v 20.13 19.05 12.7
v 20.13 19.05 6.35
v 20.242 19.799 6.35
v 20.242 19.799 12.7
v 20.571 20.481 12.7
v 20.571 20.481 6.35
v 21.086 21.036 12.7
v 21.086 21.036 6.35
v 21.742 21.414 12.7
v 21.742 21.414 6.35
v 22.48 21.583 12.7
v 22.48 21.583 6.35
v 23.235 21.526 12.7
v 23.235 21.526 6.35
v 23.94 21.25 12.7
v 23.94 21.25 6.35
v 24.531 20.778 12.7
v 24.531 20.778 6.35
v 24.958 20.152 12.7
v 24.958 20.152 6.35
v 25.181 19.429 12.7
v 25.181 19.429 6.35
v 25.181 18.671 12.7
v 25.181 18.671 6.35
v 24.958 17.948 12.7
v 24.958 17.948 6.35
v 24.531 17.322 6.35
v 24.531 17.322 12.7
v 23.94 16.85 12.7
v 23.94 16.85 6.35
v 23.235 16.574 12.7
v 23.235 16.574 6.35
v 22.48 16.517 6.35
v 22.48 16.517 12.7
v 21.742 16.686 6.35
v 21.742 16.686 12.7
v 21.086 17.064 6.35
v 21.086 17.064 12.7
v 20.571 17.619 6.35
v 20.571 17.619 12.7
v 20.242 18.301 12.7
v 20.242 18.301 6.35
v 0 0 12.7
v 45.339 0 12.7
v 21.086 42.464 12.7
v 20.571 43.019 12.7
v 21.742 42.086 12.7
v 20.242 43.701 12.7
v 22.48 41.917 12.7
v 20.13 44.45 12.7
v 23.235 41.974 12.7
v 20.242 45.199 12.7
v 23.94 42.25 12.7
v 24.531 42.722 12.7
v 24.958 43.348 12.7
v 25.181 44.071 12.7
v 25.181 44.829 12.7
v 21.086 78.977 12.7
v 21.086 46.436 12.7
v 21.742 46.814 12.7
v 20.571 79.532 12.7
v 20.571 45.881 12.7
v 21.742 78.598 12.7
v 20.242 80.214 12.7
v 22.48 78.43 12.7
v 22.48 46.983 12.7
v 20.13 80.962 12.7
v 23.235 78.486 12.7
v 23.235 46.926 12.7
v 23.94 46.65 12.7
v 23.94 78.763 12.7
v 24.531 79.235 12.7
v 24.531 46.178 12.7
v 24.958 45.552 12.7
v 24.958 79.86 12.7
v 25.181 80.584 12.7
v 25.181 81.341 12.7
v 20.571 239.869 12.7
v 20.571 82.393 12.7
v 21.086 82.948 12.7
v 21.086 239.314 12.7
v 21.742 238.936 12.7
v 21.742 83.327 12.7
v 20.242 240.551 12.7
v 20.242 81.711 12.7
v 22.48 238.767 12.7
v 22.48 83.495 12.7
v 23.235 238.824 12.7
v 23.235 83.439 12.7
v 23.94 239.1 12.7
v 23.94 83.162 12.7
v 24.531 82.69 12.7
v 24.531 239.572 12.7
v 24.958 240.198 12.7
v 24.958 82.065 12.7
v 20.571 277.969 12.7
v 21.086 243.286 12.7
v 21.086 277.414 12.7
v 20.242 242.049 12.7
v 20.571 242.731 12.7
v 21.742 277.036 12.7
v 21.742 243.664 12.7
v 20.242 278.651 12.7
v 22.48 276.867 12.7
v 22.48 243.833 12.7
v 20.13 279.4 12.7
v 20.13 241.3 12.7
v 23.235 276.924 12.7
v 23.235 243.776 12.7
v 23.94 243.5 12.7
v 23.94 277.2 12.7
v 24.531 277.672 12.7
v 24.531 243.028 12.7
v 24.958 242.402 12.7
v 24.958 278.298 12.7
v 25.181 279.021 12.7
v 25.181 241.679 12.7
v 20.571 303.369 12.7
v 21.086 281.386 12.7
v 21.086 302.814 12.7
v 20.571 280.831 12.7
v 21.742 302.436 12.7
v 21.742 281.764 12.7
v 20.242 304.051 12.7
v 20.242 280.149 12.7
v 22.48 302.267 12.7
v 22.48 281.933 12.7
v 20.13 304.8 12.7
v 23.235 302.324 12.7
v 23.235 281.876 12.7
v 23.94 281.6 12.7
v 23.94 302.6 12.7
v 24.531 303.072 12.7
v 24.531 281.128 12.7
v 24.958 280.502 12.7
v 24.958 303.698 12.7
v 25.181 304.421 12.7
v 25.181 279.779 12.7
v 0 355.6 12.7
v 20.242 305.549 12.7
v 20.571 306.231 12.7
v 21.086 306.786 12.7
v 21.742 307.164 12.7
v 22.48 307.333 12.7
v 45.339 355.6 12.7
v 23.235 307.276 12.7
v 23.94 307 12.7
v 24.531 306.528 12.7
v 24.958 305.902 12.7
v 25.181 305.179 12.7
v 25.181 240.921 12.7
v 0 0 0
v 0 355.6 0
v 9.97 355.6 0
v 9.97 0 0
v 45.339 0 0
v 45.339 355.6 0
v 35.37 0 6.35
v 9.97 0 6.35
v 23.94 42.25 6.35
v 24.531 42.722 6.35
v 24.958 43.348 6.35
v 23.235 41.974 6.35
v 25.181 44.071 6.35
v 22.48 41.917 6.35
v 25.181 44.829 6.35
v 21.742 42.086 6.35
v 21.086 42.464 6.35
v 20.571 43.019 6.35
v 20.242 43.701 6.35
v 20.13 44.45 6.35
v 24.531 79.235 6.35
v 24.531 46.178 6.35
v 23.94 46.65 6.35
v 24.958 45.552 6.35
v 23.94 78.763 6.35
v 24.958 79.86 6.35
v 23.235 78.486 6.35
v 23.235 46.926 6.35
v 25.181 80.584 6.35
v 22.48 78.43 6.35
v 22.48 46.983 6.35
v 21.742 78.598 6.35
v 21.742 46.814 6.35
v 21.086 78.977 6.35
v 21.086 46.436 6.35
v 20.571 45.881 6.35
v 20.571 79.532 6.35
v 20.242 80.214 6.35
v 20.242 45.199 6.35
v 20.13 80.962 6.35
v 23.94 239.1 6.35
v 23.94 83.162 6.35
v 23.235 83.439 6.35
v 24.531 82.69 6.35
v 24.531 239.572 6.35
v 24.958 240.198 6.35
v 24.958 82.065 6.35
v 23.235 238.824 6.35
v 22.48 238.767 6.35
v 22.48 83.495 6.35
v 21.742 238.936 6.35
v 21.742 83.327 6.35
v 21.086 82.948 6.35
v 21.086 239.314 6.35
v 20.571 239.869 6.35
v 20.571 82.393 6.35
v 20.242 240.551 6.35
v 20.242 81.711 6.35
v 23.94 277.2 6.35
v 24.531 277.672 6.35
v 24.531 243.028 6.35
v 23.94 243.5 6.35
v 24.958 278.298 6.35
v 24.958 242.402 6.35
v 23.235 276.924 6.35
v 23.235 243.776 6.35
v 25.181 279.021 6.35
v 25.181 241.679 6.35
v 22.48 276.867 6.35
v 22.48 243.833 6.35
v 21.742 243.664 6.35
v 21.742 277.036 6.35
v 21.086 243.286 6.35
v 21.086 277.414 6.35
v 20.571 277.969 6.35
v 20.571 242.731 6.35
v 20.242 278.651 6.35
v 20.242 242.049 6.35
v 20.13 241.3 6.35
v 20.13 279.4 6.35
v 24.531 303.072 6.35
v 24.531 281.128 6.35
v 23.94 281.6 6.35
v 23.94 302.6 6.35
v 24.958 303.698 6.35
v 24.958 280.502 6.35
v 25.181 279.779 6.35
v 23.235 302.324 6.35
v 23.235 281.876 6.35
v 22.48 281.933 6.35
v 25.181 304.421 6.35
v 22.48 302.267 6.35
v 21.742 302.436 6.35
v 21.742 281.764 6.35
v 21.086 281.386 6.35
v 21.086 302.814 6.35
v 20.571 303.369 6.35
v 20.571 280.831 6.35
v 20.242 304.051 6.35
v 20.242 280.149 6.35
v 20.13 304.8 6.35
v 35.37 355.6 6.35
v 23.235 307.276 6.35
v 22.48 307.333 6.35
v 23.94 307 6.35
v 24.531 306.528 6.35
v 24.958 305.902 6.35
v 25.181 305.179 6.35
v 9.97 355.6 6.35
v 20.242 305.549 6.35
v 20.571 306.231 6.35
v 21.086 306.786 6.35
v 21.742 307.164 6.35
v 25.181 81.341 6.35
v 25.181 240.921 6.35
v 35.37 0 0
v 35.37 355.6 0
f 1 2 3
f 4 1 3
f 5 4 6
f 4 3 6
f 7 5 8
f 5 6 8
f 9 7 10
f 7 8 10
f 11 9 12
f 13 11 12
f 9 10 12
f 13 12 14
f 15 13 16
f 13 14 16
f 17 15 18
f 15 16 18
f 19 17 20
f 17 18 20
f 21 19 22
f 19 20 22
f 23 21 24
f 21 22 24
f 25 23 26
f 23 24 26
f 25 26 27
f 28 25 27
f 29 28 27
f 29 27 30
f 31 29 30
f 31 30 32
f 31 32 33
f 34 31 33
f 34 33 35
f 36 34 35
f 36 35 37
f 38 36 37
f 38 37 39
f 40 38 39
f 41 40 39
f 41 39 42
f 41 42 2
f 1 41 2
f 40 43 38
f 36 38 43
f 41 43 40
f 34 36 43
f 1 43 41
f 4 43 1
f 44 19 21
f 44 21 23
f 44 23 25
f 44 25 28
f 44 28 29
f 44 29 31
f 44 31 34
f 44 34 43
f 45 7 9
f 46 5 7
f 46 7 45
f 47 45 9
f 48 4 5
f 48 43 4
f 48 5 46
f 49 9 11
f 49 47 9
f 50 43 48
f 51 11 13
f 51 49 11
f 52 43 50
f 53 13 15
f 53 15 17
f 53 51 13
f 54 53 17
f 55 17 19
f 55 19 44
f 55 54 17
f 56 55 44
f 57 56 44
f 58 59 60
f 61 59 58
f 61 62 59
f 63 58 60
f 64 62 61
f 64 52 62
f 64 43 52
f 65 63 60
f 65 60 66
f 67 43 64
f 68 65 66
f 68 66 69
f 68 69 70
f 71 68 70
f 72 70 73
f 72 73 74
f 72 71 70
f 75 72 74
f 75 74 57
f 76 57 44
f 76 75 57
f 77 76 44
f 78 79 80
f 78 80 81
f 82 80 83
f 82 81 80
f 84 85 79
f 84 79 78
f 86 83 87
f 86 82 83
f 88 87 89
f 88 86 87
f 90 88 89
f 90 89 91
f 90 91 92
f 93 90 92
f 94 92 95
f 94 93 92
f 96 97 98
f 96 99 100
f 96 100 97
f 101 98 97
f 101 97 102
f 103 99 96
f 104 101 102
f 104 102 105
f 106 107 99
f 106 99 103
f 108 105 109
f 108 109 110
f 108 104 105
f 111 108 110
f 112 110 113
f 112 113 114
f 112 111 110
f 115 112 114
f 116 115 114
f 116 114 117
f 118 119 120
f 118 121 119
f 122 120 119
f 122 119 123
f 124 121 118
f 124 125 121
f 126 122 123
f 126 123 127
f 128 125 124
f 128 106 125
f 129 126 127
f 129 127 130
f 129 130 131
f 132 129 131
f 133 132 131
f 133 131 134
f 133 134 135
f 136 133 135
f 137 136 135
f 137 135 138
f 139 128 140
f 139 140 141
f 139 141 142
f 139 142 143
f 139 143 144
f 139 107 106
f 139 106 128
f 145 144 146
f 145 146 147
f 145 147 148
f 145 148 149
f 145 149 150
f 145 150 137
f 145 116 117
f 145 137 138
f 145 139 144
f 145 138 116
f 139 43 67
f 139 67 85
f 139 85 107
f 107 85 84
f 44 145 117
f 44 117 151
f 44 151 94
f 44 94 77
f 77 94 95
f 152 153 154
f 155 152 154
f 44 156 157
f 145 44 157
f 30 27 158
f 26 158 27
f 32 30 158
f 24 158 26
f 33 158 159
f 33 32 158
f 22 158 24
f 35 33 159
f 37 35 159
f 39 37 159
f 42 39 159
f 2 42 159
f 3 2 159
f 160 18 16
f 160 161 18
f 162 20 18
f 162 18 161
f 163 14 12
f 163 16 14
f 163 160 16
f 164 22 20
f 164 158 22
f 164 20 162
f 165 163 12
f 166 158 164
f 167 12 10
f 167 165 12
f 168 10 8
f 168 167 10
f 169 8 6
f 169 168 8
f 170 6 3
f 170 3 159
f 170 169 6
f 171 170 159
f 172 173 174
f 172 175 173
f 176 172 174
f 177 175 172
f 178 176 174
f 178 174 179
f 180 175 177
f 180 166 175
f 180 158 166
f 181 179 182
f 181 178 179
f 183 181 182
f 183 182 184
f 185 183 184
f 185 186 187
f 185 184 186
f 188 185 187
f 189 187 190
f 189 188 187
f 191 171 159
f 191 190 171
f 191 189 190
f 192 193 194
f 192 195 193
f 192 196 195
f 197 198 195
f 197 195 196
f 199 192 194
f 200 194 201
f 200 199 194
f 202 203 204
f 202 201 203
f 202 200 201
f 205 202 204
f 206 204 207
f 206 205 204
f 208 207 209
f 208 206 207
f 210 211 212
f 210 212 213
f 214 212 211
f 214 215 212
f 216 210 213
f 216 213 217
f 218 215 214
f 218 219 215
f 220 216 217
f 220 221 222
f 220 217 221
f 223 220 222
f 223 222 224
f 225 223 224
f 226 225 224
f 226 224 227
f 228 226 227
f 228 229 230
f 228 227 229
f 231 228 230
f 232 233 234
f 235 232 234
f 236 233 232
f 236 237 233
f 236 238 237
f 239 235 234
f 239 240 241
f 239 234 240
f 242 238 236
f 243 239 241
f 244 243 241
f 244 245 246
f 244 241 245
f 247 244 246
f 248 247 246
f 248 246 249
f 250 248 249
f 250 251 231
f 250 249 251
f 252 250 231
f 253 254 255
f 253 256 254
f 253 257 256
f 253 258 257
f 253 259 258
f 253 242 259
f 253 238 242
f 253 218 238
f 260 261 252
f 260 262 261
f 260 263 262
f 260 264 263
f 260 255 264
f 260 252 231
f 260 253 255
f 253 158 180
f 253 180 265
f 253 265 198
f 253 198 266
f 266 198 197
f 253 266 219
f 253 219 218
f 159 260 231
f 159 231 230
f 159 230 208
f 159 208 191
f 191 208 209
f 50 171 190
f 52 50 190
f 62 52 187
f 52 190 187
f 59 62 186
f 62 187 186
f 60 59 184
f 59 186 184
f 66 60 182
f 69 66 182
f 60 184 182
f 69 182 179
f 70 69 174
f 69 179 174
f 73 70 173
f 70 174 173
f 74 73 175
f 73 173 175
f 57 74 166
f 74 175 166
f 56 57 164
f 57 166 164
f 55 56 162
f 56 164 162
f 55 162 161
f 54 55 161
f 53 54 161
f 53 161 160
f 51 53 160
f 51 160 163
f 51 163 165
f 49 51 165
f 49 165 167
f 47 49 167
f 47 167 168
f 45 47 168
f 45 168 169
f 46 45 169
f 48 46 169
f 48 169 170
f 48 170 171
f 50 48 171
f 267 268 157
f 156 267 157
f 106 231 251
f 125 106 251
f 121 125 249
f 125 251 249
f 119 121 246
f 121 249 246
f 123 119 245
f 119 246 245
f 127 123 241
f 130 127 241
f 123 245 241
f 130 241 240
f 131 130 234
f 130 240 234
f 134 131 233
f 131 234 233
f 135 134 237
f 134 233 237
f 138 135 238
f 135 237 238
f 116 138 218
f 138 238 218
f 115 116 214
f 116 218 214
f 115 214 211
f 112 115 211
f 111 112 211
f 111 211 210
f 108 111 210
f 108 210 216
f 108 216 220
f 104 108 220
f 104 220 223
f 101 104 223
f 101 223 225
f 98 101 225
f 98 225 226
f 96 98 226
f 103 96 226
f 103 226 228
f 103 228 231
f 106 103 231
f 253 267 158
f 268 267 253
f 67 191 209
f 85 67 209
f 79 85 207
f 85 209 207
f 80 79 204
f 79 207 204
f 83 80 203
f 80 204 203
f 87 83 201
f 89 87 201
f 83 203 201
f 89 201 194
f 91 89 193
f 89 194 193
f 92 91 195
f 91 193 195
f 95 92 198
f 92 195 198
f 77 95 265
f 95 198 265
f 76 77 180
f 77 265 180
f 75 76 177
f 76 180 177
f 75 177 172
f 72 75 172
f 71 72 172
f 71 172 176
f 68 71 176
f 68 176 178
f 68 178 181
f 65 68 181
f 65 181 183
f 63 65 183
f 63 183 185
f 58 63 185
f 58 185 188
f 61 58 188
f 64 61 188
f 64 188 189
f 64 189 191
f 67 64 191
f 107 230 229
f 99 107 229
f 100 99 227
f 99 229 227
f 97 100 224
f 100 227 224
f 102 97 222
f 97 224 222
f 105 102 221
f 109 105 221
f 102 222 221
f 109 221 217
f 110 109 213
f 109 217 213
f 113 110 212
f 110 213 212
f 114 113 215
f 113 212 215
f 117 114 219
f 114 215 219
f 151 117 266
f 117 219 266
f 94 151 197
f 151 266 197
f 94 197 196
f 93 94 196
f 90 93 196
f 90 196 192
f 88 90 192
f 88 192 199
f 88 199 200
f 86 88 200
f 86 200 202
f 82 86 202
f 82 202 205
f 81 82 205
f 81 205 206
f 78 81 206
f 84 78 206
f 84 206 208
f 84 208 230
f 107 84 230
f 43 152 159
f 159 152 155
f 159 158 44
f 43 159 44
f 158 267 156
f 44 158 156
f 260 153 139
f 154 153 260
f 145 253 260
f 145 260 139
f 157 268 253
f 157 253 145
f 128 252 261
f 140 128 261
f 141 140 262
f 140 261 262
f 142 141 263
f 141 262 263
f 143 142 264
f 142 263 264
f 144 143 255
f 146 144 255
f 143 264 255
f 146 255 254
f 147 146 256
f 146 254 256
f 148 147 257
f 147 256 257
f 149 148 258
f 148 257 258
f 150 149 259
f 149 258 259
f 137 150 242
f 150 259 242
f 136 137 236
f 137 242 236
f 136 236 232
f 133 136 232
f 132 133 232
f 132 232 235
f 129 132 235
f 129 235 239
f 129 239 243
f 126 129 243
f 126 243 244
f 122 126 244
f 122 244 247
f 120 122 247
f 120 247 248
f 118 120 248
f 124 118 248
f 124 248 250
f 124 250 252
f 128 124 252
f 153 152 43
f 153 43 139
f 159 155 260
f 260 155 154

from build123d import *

# Parameters (mm, degrees)
SKETCH1_W           = 45.339
SKETCH1_H           = 355.6
BOSS_EXTRUDE1_DEPTH = 12.7
SKETCH2_W           = 25.4
SKETCH2_H           = 355.6
CUT_EXTRUDE1_DEPTH  = 6.35
SKETCH3_R           = 2.54
CUT_EXTRUDE2_DEPTH  = 7.35


with BuildPart() as part:
    # Sketch1 → Boss-Extrude1 (new body)
    with BuildSketch(Plane.XY):
        with Locations((22.6695, 177.8)):
            Rectangle(SKETCH1_W, SKETCH1_H)
    extrude(amount=BOSS_EXTRUDE1_DEPTH)

    # Sketch2 → Cut-Extrude1 (cut)
    with BuildSketch(Plane(origin=(0, 0, 0), x_dir=(-1, 0, 0), z_dir=(0, 0, -1))):
        with Locations((-22.6695, 177.8)):
            Rectangle(SKETCH2_W, SKETCH2_H)
    extrude(amount=-CUT_EXTRUDE1_DEPTH, mode=Mode.SUBTRACT)

    # Sketch3 → Cut-Extrude2 (cut, through all)
    with BuildSketch(Plane(origin=(0, 0, 6.35), x_dir=(-1, 0, 0), z_dir=(0, 0, -1))):
        with Locations((-22.6695, 19.05)):
            Circle(SKETCH3_R)
        with Locations((-22.6695, 44.45)):
            Circle(SKETCH3_R)
        with Locations((-22.6695, 304.8)):
            Circle(SKETCH3_R)
        with Locations((-22.6695, 279.4)):
            Circle(SKETCH3_R)
        with Locations((-22.6695, 241.3)):
            Circle(SKETCH3_R)
        with Locations((-22.6695, 80.9625)):
            Circle(SKETCH3_R)
    extrude(amount=-CUT_EXTRUDE2_DEPTH, mode=Mode.SUBTRACT)


solid = part.part
